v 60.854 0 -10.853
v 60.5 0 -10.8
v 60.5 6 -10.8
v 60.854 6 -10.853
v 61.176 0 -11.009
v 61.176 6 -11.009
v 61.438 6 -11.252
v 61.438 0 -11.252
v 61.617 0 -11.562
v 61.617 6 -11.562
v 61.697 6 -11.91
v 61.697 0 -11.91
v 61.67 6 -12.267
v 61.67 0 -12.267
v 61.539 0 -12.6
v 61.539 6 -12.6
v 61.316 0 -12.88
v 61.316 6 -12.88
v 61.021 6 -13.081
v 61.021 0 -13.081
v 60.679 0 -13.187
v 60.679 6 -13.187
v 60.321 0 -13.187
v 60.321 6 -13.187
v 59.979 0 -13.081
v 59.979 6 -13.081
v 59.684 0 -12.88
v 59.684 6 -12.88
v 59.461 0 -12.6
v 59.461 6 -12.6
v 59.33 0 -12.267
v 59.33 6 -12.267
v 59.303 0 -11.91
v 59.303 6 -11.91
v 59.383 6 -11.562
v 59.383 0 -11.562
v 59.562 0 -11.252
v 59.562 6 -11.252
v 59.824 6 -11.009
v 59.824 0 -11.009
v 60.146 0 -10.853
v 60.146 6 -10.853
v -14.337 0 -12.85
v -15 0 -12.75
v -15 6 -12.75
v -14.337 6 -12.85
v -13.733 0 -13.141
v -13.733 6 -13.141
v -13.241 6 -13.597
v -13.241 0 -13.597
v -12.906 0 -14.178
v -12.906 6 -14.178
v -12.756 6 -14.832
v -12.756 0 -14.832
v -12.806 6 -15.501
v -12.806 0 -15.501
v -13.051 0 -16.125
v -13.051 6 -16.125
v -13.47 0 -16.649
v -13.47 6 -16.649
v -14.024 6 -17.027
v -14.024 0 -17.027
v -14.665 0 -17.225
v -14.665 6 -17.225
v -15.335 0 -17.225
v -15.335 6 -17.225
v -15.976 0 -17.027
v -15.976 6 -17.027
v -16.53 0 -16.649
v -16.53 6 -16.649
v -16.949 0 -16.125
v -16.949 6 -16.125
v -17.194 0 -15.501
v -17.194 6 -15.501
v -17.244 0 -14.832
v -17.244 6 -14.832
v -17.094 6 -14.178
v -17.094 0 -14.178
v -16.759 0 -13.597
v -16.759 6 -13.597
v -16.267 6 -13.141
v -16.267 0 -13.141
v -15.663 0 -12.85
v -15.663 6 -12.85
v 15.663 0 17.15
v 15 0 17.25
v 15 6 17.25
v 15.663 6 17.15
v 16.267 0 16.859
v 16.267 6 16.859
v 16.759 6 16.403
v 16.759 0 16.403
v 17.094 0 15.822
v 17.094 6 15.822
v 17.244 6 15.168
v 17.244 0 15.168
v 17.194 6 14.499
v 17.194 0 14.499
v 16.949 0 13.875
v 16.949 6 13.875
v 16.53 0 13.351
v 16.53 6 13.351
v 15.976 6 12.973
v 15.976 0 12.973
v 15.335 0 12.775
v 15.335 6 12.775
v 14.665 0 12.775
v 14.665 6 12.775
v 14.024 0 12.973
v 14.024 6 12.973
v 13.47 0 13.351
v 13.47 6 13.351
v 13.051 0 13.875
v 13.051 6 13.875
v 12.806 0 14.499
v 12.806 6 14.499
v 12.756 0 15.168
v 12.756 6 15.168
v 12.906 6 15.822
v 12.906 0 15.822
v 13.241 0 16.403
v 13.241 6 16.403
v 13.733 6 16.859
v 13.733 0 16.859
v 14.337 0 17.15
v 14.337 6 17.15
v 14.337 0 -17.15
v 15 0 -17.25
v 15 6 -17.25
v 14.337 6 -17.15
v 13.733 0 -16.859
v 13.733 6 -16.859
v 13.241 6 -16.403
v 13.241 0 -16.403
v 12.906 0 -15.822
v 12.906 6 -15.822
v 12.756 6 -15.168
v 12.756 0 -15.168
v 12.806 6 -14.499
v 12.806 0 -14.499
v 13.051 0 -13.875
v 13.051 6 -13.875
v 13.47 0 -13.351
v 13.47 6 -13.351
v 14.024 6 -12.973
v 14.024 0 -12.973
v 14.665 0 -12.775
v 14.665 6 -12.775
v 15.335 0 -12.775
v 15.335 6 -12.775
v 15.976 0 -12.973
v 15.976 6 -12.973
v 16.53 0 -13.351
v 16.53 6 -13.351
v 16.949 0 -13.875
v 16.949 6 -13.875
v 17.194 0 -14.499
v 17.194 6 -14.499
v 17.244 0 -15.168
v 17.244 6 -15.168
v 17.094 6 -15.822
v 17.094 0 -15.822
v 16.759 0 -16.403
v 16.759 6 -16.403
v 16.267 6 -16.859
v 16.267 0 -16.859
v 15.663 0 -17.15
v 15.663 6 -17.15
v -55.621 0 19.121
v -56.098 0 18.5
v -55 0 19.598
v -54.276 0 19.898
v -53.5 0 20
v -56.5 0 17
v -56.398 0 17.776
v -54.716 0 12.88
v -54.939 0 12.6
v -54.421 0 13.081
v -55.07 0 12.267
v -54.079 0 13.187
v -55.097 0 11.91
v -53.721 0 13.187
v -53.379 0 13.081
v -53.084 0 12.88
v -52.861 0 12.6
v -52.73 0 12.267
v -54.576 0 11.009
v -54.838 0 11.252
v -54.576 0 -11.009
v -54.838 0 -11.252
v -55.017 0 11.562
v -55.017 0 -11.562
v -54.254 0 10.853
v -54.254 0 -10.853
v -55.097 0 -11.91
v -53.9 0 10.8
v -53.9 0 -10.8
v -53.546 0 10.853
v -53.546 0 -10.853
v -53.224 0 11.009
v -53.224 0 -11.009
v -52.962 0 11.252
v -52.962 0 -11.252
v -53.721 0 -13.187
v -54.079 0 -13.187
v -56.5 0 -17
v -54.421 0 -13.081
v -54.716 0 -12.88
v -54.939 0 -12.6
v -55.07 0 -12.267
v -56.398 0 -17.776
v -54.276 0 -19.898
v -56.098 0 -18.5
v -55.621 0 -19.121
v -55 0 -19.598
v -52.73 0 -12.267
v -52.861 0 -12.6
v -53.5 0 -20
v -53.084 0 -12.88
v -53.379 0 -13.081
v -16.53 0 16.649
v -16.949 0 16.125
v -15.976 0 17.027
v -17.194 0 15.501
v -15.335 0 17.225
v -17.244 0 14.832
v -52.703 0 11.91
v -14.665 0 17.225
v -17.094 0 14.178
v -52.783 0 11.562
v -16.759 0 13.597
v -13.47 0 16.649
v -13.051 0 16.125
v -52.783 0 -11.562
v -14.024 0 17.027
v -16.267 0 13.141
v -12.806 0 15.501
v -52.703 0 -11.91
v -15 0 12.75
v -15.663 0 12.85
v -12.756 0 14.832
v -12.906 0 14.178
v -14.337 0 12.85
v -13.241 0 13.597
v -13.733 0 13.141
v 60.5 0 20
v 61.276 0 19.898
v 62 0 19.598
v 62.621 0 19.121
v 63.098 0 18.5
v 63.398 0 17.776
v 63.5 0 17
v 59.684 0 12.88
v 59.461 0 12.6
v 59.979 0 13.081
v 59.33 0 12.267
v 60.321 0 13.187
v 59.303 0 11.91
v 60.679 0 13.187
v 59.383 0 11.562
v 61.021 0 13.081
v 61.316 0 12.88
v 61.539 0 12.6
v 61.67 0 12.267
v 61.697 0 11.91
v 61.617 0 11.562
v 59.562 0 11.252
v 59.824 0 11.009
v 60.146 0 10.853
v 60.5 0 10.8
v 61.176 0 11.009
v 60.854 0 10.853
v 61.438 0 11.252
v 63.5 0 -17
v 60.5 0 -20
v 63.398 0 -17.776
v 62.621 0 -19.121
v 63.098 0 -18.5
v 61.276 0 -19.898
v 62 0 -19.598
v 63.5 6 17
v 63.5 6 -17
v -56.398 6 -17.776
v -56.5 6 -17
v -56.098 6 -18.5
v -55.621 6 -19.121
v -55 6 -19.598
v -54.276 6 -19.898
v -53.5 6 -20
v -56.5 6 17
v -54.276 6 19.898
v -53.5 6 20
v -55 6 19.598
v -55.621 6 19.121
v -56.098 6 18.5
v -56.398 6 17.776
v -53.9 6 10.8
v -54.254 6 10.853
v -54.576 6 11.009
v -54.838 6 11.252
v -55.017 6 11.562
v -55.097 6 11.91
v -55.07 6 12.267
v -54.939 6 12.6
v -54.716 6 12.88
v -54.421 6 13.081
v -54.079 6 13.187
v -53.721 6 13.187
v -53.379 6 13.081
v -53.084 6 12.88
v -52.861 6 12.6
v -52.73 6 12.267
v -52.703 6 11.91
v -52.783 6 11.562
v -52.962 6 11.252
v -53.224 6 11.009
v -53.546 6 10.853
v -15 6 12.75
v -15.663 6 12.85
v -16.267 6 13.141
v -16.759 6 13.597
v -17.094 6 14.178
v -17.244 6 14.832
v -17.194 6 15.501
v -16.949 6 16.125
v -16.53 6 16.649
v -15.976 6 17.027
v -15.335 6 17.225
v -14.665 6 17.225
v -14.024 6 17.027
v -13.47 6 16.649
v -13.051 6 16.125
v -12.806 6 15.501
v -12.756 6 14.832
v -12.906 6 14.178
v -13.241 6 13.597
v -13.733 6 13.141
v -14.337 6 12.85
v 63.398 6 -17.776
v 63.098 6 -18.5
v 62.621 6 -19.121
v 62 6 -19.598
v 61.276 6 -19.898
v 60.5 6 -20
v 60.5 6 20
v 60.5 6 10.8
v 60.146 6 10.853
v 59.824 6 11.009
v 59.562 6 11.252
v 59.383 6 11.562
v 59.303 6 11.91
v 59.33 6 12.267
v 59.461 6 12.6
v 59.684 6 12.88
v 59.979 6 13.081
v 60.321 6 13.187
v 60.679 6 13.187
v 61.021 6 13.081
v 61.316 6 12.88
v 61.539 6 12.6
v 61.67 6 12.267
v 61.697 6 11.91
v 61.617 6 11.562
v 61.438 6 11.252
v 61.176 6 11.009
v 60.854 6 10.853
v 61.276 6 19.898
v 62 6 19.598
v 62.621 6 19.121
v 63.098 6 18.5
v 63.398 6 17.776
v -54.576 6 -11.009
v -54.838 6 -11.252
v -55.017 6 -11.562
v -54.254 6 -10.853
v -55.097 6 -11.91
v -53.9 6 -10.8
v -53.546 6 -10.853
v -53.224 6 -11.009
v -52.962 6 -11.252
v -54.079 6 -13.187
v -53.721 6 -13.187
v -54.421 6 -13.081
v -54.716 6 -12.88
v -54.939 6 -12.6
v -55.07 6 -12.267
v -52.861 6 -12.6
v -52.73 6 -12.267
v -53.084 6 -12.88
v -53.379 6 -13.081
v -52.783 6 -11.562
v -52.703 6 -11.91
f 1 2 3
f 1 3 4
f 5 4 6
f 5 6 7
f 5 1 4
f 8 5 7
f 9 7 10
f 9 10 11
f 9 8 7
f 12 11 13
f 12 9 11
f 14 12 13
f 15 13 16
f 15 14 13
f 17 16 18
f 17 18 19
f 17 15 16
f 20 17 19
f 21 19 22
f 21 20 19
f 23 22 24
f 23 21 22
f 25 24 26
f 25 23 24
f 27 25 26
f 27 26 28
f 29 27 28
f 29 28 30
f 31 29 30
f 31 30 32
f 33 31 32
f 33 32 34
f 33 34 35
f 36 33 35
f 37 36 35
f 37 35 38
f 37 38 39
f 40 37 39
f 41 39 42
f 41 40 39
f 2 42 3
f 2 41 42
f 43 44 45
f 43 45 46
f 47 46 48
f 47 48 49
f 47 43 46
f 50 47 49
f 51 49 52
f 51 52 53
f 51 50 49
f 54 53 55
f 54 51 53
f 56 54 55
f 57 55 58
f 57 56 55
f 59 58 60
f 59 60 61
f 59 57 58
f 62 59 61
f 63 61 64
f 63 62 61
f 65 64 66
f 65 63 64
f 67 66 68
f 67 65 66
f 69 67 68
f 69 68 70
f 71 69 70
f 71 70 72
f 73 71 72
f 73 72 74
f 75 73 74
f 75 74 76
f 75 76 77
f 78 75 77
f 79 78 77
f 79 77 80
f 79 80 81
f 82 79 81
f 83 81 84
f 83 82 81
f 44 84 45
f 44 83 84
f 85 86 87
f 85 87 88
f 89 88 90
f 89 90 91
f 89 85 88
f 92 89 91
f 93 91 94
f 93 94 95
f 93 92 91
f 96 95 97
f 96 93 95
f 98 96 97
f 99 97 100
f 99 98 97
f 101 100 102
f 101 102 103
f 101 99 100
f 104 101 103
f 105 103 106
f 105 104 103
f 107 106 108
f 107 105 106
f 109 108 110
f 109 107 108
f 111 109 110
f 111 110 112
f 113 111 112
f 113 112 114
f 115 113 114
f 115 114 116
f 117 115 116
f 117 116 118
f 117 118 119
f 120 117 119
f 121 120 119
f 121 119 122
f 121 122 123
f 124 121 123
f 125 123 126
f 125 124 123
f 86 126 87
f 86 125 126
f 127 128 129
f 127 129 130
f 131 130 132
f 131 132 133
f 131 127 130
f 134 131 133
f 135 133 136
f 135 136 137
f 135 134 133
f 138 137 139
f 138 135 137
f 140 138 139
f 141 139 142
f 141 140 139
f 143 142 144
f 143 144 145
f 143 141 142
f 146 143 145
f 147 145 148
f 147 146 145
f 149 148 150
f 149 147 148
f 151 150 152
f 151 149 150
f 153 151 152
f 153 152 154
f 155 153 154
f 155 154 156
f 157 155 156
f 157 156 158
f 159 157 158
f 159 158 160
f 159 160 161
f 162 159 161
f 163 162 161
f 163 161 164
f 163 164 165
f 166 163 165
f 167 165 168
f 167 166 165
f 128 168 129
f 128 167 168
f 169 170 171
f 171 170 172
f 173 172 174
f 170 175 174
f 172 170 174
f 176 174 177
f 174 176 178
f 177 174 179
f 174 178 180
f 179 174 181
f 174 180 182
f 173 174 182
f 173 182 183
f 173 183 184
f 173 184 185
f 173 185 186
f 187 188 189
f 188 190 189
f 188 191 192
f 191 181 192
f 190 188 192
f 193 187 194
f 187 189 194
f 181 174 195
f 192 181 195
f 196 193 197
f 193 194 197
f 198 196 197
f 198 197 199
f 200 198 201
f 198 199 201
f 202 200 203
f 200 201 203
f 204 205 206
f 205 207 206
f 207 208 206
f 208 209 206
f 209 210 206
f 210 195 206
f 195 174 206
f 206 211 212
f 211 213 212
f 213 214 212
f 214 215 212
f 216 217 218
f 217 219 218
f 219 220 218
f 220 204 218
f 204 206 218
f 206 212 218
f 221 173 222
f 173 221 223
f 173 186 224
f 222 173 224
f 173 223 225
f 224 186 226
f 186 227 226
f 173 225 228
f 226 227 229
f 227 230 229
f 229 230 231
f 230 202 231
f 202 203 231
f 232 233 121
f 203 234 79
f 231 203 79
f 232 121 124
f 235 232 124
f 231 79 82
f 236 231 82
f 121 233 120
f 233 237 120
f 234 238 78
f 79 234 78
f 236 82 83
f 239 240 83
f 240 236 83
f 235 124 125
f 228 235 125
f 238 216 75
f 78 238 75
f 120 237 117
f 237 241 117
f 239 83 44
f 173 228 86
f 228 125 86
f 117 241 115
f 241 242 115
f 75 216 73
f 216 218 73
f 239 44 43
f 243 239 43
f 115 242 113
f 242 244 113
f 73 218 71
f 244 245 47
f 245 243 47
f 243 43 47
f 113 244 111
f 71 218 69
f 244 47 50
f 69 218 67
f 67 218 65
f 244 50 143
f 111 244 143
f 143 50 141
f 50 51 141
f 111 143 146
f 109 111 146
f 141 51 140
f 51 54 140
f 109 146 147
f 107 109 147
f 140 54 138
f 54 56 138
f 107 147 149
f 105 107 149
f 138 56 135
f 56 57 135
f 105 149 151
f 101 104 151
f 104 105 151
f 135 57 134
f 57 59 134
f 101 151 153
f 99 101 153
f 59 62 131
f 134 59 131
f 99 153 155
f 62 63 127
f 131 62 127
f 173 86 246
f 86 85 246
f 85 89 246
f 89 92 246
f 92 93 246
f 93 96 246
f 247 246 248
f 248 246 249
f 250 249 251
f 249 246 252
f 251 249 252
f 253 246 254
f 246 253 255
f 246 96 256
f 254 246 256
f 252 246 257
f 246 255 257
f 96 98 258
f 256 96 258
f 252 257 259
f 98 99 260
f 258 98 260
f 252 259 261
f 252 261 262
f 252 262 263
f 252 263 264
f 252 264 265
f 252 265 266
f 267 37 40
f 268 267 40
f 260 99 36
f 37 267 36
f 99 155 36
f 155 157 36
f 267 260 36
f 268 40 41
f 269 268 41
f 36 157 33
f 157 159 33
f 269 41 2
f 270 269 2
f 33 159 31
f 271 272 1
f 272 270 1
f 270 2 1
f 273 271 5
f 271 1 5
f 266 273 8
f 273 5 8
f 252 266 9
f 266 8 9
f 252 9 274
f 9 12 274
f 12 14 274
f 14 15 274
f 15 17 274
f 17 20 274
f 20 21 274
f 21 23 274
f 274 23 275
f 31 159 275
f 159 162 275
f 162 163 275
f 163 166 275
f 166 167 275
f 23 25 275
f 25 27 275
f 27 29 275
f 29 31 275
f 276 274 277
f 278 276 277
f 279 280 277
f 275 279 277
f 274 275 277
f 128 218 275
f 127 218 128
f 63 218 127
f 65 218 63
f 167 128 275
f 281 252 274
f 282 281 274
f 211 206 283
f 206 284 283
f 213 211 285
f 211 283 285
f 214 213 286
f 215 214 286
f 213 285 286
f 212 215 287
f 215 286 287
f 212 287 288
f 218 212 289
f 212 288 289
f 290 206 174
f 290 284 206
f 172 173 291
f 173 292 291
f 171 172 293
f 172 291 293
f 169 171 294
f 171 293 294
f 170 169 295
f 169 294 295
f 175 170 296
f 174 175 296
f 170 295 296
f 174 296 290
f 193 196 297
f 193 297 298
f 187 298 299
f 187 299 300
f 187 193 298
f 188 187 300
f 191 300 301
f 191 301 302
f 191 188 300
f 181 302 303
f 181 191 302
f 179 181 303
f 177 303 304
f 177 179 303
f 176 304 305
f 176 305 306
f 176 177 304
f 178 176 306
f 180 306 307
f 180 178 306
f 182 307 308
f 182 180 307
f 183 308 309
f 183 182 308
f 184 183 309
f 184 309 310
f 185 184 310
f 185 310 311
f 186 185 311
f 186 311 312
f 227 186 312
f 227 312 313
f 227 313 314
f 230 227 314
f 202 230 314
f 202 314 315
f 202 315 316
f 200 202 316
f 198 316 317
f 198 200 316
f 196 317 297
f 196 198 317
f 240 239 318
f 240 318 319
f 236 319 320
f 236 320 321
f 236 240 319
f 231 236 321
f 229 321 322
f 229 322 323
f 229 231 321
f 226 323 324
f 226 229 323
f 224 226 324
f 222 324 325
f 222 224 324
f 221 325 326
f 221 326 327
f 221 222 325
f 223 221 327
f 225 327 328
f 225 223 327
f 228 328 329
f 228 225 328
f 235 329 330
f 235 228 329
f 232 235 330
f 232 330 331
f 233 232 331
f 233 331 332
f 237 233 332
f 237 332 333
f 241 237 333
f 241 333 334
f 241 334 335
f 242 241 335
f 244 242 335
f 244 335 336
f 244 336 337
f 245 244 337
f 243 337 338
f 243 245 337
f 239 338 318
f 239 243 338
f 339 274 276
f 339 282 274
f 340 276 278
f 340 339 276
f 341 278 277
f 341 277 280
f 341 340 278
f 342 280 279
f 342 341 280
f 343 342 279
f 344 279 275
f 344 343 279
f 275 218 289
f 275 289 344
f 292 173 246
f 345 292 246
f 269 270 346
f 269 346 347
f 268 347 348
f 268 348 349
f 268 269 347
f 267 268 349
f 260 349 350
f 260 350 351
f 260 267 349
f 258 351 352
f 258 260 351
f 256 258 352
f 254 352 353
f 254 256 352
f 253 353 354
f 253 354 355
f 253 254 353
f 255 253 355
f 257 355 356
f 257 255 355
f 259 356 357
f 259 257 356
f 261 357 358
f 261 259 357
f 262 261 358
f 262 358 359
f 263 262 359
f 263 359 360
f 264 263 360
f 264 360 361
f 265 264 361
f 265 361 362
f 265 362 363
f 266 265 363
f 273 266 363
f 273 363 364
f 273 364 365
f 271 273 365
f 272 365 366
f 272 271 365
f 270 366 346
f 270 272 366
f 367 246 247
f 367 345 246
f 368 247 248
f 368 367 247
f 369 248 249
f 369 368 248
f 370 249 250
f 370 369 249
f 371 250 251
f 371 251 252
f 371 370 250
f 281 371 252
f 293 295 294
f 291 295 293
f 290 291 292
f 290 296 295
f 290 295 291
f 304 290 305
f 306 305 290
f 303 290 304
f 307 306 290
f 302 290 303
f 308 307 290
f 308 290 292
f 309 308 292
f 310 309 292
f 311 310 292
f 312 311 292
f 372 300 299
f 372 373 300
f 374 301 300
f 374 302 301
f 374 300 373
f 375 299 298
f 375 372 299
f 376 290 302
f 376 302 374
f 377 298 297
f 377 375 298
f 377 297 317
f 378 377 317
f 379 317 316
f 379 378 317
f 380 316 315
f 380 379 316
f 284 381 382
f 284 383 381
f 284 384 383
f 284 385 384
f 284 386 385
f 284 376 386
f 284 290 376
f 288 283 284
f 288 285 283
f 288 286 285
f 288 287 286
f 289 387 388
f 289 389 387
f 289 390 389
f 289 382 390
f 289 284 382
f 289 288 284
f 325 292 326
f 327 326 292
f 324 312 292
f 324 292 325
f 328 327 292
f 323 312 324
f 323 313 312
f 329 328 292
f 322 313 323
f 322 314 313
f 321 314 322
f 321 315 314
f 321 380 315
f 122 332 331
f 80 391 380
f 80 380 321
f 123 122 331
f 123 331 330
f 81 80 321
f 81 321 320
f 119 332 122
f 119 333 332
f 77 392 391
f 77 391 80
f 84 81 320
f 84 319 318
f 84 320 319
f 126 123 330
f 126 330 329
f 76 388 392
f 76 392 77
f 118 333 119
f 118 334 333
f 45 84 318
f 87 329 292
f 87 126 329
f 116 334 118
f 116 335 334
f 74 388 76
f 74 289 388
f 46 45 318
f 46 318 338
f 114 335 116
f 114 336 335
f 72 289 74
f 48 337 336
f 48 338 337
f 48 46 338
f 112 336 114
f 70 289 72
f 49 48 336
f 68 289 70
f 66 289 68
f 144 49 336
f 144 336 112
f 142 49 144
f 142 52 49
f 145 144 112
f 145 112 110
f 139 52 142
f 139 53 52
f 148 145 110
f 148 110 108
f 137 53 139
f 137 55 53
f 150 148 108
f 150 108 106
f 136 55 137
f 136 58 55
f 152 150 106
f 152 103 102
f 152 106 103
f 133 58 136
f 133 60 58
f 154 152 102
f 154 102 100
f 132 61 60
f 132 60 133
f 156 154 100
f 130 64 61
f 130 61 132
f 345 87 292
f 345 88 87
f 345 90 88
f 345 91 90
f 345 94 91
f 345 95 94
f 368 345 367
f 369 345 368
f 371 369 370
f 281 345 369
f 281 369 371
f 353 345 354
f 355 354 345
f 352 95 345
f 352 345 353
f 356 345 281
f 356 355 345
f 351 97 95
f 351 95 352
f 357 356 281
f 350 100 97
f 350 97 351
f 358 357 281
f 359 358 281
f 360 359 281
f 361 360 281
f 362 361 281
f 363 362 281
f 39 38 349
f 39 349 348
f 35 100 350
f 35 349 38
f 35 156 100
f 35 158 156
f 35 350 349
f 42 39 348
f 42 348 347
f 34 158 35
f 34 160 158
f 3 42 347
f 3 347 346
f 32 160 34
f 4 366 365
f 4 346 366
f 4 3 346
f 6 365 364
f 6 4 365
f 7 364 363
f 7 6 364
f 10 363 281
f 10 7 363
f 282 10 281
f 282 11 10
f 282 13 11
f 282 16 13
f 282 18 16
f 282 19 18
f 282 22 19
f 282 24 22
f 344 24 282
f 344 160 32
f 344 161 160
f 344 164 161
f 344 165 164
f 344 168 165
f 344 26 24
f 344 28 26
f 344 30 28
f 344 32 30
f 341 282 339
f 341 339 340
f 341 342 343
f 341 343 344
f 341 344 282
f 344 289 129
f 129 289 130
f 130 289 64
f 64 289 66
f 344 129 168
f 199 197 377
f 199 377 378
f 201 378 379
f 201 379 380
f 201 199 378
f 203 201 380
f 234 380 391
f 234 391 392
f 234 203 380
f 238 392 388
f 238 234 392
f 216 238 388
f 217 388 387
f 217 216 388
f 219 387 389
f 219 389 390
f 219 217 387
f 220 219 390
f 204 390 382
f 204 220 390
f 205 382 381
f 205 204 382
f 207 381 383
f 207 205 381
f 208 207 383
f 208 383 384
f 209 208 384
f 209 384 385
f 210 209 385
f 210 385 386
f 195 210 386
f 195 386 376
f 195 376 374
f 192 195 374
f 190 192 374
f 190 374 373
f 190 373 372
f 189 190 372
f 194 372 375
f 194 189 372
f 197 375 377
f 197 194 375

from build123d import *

# Parameters (mm, degrees)
SKETCH1_W           = 127
SKETCH1_H           = 40
SKETCH1_R           = 1.2
SKETCH1_R_2         = 2.25
BOSS_EXTRUDE1_DEPTH = 6
SKETCH2_W           = 40
SKETCH2_H           = 6
CUT_EXTRUDE1_DEPTH  = 7
FILLET1_R           = 3


with BuildPart() as part:
    # Sketch1 → Boss-Extrude1 (new body)
    with BuildSketch(Plane(origin=(0, 0, 0), x_dir=(1, 0, 0), z_dir=(0, 1, 0))):
        Rectangle(SKETCH1_W, SKETCH1_H)
        with Locations(Location((60.5, 12, 0), (0, 0, 270))):
            Circle(SKETCH1_R, mode=Mode.SUBTRACT)
        with Locations(Location((-53.9, 12, 0), (0, 0, 270))):
            Circle(SKETCH1_R, mode=Mode.SUBTRACT)
        with Locations(Location((-15, 15, 0), (0, 0, 270))):
            Circle(SKETCH1_R_2, mode=Mode.SUBTRACT)
        with Locations(Location((15, 15, 0), (0, 0, 90))):
            Circle(SKETCH1_R_2, mode=Mode.SUBTRACT)
        with Locations(Location((60.5, -12, 0), (0, 0, 90))):
            Circle(SKETCH1_R, mode=Mode.SUBTRACT)
        with Locations(Location((15, -15, 0), (0, 0, 270))):
            Circle(SKETCH1_R_2, mode=Mode.SUBTRACT)
        with Locations(Location((-15, -15, 0), (0, 0, 90))):
            Circle(SKETCH1_R_2, mode=Mode.SUBTRACT)
        with Locations(Location((-53.9, -12, 0), (0, 0, 90))):
            Circle(SKETCH1_R, mode=Mode.SUBTRACT)
    extrude(amount=BOSS_EXTRUDE1_DEPTH)

    # Sketch2 → Cut-Extrude1 (cut)
    with BuildSketch(Plane.ZY.offset(63.5)):
        with Locations((0, 3)):
            Rectangle(SKETCH2_W, SKETCH2_H)
    extrude(amount=-CUT_EXTRUDE1_DEPTH, mode=Mode.SUBTRACT)

    # Fillet1
    fillet1_edges = [part.edges().sort_by_distance(p)[0] for p in [
        (-56.5, 3, -20),
        (-56.5, 3, 20),
        (63.5, 3, 20),
        (63.5, 3, -20),
    ]]
    fillet(fillet1_edges, radius=FILLET1_R)


solid = part.part
